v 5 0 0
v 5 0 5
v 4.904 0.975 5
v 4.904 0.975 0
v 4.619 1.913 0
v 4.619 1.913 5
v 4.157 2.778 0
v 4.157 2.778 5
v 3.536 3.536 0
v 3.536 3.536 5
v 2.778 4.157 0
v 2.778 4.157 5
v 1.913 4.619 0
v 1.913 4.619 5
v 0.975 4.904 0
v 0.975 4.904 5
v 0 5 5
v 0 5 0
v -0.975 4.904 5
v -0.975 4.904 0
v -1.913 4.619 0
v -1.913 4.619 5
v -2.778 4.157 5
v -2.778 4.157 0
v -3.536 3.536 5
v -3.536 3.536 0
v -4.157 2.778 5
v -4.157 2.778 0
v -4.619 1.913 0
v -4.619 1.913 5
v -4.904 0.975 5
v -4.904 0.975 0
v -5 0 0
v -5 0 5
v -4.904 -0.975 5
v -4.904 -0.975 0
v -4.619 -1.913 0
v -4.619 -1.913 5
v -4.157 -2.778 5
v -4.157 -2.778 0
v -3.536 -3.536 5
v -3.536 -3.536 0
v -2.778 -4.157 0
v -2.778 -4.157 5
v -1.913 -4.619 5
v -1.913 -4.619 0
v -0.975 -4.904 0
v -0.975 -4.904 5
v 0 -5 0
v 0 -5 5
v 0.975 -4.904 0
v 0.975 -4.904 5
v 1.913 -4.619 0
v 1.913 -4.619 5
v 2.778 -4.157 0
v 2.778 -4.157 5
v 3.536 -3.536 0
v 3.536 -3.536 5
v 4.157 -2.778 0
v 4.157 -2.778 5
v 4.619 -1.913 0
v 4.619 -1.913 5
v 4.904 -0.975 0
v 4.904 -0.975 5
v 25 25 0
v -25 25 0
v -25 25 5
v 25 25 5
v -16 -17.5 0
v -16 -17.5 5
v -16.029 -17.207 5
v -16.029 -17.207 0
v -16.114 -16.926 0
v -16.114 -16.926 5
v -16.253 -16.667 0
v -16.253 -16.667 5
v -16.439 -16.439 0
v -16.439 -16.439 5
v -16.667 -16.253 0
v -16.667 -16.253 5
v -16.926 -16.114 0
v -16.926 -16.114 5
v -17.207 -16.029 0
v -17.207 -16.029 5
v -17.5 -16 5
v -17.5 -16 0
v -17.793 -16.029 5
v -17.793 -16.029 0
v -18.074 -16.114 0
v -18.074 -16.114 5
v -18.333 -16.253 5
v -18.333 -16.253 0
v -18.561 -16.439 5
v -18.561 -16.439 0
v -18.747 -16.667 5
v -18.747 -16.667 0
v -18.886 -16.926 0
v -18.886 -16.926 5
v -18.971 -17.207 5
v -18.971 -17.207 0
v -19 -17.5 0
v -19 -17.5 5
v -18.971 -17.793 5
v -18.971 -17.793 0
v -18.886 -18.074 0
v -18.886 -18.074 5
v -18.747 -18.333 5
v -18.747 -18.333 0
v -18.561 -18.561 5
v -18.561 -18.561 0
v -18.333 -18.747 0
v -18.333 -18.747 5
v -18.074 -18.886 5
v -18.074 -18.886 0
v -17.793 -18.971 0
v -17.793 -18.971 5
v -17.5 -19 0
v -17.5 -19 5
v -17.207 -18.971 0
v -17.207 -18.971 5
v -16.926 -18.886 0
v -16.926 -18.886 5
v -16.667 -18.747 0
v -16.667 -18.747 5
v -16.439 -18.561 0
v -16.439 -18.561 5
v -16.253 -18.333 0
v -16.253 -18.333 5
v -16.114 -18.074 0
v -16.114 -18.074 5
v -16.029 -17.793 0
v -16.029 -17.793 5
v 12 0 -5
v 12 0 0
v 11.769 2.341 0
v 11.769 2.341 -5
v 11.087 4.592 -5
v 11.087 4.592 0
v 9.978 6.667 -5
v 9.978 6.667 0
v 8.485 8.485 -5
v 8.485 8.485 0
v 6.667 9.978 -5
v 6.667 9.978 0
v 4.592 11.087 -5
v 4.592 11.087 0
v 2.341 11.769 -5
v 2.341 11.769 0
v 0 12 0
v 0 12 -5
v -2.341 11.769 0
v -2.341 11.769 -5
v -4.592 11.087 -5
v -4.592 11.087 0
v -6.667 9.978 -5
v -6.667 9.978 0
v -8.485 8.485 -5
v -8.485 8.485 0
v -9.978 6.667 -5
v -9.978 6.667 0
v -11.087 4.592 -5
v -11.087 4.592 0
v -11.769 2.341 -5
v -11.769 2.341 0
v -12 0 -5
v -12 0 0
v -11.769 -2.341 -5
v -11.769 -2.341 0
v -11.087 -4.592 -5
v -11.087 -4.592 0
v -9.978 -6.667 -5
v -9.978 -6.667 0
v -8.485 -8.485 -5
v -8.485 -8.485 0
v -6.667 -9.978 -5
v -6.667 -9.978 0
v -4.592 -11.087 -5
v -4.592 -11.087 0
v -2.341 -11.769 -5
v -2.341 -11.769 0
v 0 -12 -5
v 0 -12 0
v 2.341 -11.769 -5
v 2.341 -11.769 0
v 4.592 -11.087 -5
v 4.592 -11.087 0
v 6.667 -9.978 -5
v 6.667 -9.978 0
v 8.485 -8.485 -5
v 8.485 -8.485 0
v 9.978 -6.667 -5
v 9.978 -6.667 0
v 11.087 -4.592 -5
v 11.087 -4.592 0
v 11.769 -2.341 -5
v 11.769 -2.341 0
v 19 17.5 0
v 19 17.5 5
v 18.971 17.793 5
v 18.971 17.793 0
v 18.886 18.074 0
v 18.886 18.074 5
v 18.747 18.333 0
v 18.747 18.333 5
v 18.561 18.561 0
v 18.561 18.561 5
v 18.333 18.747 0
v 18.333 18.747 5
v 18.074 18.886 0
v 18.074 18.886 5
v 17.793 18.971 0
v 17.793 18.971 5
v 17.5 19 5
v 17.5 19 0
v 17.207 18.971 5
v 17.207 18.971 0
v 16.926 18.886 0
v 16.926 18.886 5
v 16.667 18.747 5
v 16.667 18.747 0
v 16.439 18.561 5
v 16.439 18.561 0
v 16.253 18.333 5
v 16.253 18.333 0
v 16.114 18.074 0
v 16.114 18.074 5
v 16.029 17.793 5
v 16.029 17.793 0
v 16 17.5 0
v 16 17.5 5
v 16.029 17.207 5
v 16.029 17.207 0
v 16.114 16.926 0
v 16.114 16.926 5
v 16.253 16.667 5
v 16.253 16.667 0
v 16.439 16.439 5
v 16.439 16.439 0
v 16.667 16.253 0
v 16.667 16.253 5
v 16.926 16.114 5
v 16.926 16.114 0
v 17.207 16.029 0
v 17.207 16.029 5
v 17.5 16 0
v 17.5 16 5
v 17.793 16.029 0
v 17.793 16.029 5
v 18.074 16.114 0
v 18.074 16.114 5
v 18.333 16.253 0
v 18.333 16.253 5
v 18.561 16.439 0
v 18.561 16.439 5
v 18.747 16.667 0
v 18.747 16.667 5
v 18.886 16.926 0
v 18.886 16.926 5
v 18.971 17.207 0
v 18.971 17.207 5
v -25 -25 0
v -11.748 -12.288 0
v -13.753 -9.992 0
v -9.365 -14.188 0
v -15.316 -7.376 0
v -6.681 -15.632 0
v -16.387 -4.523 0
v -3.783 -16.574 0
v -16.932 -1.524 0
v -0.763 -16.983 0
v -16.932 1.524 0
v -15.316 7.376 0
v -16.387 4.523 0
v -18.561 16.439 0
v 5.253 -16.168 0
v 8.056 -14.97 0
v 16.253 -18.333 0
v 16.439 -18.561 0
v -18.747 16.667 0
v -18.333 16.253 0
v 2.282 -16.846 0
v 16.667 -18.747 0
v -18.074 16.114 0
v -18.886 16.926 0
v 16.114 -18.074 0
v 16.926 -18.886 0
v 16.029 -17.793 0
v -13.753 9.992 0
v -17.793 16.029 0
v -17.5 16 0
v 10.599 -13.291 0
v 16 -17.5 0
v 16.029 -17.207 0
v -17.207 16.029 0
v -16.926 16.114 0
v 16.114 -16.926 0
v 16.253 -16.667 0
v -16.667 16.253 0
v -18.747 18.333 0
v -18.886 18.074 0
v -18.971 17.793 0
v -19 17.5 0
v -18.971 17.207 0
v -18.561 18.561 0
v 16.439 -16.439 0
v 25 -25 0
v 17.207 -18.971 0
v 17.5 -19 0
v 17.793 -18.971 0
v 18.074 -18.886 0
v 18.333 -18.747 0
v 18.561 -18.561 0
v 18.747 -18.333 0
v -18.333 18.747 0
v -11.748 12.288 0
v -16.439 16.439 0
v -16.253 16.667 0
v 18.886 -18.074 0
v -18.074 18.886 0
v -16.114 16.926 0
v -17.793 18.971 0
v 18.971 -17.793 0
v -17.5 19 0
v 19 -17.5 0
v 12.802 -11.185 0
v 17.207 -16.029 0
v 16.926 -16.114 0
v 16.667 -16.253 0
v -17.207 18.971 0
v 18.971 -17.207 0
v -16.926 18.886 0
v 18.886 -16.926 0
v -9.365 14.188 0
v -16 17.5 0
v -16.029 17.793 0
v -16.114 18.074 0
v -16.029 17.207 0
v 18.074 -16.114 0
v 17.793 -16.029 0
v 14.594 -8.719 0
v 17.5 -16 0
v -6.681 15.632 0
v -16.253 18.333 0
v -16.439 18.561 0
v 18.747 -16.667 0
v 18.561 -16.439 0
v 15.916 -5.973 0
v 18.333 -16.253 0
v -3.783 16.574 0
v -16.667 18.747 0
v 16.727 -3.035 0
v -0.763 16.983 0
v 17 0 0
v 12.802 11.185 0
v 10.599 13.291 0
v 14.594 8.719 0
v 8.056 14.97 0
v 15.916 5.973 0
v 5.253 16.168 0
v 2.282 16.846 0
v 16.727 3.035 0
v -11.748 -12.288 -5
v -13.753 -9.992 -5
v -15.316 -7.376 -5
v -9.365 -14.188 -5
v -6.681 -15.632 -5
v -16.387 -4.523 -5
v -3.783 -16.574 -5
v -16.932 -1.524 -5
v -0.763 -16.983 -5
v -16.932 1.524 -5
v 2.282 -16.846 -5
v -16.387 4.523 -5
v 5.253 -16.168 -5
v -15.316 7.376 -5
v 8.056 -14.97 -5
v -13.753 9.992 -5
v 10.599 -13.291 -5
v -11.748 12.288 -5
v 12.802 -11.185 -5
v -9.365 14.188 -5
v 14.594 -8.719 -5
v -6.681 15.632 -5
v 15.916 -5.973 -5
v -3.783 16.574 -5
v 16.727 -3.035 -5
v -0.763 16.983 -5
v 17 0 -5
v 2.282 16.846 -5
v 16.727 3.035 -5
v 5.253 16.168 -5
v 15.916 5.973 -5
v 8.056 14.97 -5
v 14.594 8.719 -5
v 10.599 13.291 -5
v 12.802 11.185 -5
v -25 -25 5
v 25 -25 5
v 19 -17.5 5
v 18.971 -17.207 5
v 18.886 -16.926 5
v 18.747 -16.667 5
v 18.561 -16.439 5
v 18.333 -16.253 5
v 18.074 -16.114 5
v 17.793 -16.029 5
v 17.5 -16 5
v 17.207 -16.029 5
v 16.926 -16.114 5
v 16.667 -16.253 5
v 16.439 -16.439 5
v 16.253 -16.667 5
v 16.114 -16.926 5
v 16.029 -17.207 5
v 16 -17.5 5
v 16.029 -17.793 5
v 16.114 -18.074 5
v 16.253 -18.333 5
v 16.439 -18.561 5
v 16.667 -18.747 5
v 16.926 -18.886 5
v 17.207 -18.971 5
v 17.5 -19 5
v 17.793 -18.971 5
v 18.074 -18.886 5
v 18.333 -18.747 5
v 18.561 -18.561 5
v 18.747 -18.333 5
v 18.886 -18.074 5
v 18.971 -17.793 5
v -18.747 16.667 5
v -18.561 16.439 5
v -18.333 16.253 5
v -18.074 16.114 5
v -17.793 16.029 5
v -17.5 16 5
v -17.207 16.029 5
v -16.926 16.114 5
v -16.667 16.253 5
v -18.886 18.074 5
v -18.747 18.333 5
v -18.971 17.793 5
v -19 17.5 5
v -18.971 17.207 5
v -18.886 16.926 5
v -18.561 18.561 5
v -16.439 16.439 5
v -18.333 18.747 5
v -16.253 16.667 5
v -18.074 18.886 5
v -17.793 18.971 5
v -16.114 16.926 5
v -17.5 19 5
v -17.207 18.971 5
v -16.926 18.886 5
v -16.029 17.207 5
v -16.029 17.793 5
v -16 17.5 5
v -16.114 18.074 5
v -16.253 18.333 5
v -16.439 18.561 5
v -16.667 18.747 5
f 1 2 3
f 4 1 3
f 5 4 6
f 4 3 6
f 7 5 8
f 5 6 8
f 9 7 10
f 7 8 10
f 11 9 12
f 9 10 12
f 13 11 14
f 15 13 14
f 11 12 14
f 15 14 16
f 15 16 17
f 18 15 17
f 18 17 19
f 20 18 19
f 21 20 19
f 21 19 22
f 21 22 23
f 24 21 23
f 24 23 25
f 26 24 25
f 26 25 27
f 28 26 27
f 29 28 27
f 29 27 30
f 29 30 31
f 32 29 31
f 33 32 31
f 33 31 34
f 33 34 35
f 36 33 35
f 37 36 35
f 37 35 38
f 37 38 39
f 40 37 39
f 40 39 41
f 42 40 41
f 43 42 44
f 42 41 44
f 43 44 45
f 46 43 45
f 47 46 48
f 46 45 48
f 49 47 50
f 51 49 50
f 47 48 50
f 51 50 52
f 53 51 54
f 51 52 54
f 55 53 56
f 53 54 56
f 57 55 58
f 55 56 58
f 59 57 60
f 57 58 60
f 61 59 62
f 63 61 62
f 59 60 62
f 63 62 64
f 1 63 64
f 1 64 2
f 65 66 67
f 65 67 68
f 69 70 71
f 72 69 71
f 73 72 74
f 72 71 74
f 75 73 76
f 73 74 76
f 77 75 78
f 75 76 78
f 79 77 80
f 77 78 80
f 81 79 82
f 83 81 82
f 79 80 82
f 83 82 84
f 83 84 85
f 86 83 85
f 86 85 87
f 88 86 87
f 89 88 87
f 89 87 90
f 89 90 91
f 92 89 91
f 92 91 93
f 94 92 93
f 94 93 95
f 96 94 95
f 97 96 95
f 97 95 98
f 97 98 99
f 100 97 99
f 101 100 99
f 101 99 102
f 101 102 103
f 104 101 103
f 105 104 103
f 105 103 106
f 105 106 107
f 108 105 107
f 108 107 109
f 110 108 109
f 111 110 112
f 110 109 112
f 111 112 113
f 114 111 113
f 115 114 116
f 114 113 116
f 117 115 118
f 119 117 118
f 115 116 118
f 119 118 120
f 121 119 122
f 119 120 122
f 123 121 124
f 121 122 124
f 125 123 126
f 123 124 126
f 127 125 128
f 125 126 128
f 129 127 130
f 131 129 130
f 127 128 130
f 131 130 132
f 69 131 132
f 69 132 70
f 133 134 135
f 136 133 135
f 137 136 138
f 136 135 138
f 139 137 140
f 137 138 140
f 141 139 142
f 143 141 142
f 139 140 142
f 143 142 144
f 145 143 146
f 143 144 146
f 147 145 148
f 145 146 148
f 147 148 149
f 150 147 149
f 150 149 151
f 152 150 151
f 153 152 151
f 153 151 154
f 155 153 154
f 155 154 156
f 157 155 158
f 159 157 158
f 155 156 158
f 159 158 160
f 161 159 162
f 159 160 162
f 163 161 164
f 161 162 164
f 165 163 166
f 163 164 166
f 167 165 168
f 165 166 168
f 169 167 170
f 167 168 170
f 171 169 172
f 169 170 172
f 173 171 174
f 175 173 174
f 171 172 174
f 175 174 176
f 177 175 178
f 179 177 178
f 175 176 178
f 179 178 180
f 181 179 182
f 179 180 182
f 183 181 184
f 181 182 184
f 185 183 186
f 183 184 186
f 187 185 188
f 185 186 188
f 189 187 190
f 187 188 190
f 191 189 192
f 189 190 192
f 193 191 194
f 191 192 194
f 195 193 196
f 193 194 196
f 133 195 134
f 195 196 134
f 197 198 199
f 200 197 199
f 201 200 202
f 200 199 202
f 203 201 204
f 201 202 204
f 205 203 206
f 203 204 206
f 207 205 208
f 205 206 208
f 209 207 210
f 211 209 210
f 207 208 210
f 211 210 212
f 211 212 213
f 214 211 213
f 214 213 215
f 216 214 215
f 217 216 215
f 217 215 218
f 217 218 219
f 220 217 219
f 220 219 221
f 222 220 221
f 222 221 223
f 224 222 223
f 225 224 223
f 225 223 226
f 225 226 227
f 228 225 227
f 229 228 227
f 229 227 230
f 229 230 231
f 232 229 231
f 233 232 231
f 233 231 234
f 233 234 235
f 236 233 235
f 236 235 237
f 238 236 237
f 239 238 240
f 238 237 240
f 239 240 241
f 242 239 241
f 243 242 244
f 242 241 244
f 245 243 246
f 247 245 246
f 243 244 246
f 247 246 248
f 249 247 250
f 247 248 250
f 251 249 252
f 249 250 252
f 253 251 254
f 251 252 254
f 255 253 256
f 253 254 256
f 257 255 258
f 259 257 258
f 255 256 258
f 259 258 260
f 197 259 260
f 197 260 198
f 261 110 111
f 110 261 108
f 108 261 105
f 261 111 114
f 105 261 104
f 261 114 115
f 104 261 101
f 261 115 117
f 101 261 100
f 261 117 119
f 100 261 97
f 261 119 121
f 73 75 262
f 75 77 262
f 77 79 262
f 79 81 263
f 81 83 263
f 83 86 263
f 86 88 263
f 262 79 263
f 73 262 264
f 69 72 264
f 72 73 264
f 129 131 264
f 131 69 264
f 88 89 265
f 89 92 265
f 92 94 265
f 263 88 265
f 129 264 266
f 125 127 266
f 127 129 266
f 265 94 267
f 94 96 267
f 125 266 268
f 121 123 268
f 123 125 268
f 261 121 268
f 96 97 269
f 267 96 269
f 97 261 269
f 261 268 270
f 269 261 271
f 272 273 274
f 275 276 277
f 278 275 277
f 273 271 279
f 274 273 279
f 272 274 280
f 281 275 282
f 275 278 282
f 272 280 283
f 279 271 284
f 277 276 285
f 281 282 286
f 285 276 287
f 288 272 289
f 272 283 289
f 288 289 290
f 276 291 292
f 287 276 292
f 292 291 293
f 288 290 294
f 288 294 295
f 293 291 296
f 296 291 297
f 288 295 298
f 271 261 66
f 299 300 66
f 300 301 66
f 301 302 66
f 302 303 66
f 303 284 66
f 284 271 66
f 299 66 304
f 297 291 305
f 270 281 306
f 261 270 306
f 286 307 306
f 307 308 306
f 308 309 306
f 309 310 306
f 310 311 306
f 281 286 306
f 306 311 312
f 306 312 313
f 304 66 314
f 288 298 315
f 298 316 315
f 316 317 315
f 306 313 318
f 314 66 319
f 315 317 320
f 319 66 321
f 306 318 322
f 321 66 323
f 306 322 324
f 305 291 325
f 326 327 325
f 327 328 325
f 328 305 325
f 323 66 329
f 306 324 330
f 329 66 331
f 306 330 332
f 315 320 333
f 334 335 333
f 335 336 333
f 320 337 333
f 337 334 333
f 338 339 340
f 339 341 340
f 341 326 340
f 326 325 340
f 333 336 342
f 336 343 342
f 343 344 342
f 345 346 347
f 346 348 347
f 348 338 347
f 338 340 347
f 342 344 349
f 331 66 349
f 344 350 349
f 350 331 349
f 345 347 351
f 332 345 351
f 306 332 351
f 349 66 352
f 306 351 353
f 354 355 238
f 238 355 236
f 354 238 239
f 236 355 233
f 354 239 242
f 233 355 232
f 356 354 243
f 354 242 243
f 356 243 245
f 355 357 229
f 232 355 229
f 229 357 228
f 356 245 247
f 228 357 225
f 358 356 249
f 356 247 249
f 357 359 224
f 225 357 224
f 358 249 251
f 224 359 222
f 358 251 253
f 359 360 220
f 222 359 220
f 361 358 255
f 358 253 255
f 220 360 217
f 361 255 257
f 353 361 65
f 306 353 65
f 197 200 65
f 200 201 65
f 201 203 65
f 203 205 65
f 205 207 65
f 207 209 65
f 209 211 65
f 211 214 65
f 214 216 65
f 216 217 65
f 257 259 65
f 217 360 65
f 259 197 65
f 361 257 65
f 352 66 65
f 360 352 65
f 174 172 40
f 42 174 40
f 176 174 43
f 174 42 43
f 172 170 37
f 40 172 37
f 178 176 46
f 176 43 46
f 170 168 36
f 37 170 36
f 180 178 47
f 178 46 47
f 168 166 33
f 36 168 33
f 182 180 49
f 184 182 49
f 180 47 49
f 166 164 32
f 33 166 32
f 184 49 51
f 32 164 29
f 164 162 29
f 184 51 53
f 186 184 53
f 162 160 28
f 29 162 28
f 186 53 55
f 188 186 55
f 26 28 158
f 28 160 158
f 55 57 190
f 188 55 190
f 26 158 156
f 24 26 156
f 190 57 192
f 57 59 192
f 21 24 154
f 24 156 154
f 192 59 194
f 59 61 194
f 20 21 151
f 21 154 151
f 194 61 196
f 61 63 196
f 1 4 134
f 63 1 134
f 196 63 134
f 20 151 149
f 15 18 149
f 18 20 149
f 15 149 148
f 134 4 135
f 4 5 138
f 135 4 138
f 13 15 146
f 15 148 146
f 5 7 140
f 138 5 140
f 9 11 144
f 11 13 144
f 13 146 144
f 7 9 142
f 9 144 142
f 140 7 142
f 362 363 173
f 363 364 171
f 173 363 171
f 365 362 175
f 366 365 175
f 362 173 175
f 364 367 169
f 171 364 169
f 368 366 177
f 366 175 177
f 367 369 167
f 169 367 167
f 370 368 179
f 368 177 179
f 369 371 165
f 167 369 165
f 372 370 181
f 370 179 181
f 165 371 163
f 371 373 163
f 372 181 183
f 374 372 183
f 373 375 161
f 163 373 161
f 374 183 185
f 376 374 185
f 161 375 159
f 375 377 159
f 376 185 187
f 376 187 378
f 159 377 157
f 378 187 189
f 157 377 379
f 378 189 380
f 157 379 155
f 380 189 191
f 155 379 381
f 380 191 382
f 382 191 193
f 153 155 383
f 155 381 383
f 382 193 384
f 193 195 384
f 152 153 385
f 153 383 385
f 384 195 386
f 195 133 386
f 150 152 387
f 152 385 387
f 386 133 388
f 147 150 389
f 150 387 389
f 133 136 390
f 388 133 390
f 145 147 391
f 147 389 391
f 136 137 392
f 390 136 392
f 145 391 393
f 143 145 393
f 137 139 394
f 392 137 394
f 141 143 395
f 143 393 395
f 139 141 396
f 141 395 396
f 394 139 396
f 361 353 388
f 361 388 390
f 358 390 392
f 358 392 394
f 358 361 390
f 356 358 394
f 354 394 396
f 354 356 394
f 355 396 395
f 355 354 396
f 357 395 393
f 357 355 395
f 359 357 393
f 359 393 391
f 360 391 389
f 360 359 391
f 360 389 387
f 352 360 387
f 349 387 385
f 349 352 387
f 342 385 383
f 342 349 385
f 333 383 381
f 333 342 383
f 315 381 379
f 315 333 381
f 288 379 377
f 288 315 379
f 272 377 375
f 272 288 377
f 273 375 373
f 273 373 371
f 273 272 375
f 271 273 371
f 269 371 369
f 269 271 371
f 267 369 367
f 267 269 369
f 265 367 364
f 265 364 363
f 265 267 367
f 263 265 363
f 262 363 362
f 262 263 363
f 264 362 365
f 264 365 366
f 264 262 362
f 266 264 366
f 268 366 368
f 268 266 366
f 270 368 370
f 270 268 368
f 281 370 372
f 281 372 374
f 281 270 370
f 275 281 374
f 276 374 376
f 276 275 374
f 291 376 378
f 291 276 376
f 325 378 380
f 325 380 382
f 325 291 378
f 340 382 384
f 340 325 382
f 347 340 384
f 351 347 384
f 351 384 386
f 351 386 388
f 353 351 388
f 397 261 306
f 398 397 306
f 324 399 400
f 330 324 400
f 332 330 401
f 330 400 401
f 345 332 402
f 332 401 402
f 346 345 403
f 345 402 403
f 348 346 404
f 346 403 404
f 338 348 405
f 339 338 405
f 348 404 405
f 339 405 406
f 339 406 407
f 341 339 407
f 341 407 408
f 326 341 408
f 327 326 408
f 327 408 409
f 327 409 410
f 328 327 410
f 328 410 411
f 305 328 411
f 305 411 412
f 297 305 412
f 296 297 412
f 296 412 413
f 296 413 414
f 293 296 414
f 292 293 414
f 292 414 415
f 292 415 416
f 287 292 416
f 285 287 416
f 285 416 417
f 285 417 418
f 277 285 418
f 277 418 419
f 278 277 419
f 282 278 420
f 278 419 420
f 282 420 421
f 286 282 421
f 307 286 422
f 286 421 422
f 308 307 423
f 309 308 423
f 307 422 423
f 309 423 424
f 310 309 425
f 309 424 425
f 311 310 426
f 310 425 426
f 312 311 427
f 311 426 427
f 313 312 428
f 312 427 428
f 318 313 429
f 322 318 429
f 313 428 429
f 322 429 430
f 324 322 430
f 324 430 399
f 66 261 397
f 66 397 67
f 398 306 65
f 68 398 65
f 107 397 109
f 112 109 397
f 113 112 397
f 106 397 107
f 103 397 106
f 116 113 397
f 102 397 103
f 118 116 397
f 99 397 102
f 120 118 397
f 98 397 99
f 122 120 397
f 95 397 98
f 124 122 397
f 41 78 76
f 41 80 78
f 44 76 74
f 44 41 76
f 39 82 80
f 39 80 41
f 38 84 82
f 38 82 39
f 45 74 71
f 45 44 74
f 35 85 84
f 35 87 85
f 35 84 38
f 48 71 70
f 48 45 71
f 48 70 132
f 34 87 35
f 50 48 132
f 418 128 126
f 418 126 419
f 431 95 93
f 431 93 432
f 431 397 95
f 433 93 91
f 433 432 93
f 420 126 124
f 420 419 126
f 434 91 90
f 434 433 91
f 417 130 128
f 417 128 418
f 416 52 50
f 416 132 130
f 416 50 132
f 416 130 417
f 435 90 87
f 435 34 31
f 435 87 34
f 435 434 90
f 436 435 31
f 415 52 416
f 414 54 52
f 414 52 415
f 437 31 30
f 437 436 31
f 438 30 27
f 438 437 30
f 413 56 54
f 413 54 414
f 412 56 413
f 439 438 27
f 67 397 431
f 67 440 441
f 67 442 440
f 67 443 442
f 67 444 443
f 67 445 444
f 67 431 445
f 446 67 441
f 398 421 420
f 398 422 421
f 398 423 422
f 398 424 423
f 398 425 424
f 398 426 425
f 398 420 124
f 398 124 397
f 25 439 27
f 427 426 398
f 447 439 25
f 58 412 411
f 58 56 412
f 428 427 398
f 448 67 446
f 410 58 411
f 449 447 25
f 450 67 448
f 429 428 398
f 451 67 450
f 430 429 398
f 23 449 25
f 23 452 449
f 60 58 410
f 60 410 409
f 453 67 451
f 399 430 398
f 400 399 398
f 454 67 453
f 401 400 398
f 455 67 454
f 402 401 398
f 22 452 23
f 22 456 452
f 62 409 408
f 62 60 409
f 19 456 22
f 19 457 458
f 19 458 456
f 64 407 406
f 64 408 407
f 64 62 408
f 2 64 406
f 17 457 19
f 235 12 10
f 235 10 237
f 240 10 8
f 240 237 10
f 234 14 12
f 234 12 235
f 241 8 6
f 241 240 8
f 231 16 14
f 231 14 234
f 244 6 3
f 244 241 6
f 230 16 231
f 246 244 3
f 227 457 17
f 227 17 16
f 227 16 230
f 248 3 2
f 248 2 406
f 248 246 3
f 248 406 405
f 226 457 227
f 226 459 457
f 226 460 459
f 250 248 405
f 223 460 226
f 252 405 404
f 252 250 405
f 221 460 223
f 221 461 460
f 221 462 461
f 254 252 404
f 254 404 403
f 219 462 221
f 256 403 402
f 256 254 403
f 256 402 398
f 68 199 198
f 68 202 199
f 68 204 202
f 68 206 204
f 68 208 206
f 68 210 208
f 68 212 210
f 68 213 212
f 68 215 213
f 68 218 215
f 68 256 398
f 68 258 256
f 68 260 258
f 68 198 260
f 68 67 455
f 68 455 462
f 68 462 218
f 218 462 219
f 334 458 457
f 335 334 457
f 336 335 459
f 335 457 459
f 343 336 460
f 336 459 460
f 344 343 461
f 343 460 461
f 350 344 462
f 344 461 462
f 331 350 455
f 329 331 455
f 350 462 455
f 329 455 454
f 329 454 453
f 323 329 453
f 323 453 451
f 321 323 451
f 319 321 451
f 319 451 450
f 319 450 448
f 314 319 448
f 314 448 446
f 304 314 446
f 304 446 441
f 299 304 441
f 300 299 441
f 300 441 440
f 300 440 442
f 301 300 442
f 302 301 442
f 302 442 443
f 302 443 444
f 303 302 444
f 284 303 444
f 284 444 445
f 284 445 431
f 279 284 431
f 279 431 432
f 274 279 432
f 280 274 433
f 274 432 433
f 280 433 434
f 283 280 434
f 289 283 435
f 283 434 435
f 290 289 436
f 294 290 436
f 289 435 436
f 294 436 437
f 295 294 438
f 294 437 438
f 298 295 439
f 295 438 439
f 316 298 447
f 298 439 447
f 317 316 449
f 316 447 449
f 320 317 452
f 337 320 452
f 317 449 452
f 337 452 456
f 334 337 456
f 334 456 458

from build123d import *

# Parameters (mm, degrees)
SKETCH1_R           = 17
SKETCH1_R_2         = 12
BOSS_EXTRUDE1_DEPTH = 5
SKETCH2_W           = 50
SKETCH2_H           = 50
BOSS_EXTRUDE2_DEPTH = 5
SKETCH3_R           = 5
CUT_EXTRUDE1_DEPTH  = 37.742346142
SKETCH4_R           = 1.5
CUT_EXTRUDE2_DEPTH  = 37.742346142


with BuildPart() as part:
    # Sketch1 → Boss-Extrude1 (new body)
    with BuildSketch(Plane.XY):
        Circle(SKETCH1_R)
        Circle(SKETCH1_R_2, mode=Mode.SUBTRACT)
    extrude(amount=-BOSS_EXTRUDE1_DEPTH)

    # Sketch2 → Boss-Extrude2 (add)
    with BuildSketch(Plane.XY):
        Rectangle(SKETCH2_W, SKETCH2_H)
    extrude(amount=BOSS_EXTRUDE2_DEPTH)

    # Sketch3 → Cut-Extrude1 (cut, through all)
    with BuildSketch(Plane.XY.offset(5)):
        Circle(SKETCH3_R)
    extrude(amount=-CUT_EXTRUDE1_DEPTH, mode=Mode.SUBTRACT)

    # Sketch4 → Cut-Extrude2 (cut, through all)
    with BuildSketch(Plane.XY.offset(5)):
        with Locations((-17.5, 17.5)):
            Circle(SKETCH4_R)
        with Locations((17.5, 17.5)):
            Circle(SKETCH4_R)
        with Locations((-17.5, -17.5)):
            Circle(SKETCH4_R)
        with Locations((17.5, -17.5)):
            Circle(SKETCH4_R)
    extrude(amount=-CUT_EXTRUDE2_DEPTH, mode=Mode.SUBTRACT)


solid = part.part
